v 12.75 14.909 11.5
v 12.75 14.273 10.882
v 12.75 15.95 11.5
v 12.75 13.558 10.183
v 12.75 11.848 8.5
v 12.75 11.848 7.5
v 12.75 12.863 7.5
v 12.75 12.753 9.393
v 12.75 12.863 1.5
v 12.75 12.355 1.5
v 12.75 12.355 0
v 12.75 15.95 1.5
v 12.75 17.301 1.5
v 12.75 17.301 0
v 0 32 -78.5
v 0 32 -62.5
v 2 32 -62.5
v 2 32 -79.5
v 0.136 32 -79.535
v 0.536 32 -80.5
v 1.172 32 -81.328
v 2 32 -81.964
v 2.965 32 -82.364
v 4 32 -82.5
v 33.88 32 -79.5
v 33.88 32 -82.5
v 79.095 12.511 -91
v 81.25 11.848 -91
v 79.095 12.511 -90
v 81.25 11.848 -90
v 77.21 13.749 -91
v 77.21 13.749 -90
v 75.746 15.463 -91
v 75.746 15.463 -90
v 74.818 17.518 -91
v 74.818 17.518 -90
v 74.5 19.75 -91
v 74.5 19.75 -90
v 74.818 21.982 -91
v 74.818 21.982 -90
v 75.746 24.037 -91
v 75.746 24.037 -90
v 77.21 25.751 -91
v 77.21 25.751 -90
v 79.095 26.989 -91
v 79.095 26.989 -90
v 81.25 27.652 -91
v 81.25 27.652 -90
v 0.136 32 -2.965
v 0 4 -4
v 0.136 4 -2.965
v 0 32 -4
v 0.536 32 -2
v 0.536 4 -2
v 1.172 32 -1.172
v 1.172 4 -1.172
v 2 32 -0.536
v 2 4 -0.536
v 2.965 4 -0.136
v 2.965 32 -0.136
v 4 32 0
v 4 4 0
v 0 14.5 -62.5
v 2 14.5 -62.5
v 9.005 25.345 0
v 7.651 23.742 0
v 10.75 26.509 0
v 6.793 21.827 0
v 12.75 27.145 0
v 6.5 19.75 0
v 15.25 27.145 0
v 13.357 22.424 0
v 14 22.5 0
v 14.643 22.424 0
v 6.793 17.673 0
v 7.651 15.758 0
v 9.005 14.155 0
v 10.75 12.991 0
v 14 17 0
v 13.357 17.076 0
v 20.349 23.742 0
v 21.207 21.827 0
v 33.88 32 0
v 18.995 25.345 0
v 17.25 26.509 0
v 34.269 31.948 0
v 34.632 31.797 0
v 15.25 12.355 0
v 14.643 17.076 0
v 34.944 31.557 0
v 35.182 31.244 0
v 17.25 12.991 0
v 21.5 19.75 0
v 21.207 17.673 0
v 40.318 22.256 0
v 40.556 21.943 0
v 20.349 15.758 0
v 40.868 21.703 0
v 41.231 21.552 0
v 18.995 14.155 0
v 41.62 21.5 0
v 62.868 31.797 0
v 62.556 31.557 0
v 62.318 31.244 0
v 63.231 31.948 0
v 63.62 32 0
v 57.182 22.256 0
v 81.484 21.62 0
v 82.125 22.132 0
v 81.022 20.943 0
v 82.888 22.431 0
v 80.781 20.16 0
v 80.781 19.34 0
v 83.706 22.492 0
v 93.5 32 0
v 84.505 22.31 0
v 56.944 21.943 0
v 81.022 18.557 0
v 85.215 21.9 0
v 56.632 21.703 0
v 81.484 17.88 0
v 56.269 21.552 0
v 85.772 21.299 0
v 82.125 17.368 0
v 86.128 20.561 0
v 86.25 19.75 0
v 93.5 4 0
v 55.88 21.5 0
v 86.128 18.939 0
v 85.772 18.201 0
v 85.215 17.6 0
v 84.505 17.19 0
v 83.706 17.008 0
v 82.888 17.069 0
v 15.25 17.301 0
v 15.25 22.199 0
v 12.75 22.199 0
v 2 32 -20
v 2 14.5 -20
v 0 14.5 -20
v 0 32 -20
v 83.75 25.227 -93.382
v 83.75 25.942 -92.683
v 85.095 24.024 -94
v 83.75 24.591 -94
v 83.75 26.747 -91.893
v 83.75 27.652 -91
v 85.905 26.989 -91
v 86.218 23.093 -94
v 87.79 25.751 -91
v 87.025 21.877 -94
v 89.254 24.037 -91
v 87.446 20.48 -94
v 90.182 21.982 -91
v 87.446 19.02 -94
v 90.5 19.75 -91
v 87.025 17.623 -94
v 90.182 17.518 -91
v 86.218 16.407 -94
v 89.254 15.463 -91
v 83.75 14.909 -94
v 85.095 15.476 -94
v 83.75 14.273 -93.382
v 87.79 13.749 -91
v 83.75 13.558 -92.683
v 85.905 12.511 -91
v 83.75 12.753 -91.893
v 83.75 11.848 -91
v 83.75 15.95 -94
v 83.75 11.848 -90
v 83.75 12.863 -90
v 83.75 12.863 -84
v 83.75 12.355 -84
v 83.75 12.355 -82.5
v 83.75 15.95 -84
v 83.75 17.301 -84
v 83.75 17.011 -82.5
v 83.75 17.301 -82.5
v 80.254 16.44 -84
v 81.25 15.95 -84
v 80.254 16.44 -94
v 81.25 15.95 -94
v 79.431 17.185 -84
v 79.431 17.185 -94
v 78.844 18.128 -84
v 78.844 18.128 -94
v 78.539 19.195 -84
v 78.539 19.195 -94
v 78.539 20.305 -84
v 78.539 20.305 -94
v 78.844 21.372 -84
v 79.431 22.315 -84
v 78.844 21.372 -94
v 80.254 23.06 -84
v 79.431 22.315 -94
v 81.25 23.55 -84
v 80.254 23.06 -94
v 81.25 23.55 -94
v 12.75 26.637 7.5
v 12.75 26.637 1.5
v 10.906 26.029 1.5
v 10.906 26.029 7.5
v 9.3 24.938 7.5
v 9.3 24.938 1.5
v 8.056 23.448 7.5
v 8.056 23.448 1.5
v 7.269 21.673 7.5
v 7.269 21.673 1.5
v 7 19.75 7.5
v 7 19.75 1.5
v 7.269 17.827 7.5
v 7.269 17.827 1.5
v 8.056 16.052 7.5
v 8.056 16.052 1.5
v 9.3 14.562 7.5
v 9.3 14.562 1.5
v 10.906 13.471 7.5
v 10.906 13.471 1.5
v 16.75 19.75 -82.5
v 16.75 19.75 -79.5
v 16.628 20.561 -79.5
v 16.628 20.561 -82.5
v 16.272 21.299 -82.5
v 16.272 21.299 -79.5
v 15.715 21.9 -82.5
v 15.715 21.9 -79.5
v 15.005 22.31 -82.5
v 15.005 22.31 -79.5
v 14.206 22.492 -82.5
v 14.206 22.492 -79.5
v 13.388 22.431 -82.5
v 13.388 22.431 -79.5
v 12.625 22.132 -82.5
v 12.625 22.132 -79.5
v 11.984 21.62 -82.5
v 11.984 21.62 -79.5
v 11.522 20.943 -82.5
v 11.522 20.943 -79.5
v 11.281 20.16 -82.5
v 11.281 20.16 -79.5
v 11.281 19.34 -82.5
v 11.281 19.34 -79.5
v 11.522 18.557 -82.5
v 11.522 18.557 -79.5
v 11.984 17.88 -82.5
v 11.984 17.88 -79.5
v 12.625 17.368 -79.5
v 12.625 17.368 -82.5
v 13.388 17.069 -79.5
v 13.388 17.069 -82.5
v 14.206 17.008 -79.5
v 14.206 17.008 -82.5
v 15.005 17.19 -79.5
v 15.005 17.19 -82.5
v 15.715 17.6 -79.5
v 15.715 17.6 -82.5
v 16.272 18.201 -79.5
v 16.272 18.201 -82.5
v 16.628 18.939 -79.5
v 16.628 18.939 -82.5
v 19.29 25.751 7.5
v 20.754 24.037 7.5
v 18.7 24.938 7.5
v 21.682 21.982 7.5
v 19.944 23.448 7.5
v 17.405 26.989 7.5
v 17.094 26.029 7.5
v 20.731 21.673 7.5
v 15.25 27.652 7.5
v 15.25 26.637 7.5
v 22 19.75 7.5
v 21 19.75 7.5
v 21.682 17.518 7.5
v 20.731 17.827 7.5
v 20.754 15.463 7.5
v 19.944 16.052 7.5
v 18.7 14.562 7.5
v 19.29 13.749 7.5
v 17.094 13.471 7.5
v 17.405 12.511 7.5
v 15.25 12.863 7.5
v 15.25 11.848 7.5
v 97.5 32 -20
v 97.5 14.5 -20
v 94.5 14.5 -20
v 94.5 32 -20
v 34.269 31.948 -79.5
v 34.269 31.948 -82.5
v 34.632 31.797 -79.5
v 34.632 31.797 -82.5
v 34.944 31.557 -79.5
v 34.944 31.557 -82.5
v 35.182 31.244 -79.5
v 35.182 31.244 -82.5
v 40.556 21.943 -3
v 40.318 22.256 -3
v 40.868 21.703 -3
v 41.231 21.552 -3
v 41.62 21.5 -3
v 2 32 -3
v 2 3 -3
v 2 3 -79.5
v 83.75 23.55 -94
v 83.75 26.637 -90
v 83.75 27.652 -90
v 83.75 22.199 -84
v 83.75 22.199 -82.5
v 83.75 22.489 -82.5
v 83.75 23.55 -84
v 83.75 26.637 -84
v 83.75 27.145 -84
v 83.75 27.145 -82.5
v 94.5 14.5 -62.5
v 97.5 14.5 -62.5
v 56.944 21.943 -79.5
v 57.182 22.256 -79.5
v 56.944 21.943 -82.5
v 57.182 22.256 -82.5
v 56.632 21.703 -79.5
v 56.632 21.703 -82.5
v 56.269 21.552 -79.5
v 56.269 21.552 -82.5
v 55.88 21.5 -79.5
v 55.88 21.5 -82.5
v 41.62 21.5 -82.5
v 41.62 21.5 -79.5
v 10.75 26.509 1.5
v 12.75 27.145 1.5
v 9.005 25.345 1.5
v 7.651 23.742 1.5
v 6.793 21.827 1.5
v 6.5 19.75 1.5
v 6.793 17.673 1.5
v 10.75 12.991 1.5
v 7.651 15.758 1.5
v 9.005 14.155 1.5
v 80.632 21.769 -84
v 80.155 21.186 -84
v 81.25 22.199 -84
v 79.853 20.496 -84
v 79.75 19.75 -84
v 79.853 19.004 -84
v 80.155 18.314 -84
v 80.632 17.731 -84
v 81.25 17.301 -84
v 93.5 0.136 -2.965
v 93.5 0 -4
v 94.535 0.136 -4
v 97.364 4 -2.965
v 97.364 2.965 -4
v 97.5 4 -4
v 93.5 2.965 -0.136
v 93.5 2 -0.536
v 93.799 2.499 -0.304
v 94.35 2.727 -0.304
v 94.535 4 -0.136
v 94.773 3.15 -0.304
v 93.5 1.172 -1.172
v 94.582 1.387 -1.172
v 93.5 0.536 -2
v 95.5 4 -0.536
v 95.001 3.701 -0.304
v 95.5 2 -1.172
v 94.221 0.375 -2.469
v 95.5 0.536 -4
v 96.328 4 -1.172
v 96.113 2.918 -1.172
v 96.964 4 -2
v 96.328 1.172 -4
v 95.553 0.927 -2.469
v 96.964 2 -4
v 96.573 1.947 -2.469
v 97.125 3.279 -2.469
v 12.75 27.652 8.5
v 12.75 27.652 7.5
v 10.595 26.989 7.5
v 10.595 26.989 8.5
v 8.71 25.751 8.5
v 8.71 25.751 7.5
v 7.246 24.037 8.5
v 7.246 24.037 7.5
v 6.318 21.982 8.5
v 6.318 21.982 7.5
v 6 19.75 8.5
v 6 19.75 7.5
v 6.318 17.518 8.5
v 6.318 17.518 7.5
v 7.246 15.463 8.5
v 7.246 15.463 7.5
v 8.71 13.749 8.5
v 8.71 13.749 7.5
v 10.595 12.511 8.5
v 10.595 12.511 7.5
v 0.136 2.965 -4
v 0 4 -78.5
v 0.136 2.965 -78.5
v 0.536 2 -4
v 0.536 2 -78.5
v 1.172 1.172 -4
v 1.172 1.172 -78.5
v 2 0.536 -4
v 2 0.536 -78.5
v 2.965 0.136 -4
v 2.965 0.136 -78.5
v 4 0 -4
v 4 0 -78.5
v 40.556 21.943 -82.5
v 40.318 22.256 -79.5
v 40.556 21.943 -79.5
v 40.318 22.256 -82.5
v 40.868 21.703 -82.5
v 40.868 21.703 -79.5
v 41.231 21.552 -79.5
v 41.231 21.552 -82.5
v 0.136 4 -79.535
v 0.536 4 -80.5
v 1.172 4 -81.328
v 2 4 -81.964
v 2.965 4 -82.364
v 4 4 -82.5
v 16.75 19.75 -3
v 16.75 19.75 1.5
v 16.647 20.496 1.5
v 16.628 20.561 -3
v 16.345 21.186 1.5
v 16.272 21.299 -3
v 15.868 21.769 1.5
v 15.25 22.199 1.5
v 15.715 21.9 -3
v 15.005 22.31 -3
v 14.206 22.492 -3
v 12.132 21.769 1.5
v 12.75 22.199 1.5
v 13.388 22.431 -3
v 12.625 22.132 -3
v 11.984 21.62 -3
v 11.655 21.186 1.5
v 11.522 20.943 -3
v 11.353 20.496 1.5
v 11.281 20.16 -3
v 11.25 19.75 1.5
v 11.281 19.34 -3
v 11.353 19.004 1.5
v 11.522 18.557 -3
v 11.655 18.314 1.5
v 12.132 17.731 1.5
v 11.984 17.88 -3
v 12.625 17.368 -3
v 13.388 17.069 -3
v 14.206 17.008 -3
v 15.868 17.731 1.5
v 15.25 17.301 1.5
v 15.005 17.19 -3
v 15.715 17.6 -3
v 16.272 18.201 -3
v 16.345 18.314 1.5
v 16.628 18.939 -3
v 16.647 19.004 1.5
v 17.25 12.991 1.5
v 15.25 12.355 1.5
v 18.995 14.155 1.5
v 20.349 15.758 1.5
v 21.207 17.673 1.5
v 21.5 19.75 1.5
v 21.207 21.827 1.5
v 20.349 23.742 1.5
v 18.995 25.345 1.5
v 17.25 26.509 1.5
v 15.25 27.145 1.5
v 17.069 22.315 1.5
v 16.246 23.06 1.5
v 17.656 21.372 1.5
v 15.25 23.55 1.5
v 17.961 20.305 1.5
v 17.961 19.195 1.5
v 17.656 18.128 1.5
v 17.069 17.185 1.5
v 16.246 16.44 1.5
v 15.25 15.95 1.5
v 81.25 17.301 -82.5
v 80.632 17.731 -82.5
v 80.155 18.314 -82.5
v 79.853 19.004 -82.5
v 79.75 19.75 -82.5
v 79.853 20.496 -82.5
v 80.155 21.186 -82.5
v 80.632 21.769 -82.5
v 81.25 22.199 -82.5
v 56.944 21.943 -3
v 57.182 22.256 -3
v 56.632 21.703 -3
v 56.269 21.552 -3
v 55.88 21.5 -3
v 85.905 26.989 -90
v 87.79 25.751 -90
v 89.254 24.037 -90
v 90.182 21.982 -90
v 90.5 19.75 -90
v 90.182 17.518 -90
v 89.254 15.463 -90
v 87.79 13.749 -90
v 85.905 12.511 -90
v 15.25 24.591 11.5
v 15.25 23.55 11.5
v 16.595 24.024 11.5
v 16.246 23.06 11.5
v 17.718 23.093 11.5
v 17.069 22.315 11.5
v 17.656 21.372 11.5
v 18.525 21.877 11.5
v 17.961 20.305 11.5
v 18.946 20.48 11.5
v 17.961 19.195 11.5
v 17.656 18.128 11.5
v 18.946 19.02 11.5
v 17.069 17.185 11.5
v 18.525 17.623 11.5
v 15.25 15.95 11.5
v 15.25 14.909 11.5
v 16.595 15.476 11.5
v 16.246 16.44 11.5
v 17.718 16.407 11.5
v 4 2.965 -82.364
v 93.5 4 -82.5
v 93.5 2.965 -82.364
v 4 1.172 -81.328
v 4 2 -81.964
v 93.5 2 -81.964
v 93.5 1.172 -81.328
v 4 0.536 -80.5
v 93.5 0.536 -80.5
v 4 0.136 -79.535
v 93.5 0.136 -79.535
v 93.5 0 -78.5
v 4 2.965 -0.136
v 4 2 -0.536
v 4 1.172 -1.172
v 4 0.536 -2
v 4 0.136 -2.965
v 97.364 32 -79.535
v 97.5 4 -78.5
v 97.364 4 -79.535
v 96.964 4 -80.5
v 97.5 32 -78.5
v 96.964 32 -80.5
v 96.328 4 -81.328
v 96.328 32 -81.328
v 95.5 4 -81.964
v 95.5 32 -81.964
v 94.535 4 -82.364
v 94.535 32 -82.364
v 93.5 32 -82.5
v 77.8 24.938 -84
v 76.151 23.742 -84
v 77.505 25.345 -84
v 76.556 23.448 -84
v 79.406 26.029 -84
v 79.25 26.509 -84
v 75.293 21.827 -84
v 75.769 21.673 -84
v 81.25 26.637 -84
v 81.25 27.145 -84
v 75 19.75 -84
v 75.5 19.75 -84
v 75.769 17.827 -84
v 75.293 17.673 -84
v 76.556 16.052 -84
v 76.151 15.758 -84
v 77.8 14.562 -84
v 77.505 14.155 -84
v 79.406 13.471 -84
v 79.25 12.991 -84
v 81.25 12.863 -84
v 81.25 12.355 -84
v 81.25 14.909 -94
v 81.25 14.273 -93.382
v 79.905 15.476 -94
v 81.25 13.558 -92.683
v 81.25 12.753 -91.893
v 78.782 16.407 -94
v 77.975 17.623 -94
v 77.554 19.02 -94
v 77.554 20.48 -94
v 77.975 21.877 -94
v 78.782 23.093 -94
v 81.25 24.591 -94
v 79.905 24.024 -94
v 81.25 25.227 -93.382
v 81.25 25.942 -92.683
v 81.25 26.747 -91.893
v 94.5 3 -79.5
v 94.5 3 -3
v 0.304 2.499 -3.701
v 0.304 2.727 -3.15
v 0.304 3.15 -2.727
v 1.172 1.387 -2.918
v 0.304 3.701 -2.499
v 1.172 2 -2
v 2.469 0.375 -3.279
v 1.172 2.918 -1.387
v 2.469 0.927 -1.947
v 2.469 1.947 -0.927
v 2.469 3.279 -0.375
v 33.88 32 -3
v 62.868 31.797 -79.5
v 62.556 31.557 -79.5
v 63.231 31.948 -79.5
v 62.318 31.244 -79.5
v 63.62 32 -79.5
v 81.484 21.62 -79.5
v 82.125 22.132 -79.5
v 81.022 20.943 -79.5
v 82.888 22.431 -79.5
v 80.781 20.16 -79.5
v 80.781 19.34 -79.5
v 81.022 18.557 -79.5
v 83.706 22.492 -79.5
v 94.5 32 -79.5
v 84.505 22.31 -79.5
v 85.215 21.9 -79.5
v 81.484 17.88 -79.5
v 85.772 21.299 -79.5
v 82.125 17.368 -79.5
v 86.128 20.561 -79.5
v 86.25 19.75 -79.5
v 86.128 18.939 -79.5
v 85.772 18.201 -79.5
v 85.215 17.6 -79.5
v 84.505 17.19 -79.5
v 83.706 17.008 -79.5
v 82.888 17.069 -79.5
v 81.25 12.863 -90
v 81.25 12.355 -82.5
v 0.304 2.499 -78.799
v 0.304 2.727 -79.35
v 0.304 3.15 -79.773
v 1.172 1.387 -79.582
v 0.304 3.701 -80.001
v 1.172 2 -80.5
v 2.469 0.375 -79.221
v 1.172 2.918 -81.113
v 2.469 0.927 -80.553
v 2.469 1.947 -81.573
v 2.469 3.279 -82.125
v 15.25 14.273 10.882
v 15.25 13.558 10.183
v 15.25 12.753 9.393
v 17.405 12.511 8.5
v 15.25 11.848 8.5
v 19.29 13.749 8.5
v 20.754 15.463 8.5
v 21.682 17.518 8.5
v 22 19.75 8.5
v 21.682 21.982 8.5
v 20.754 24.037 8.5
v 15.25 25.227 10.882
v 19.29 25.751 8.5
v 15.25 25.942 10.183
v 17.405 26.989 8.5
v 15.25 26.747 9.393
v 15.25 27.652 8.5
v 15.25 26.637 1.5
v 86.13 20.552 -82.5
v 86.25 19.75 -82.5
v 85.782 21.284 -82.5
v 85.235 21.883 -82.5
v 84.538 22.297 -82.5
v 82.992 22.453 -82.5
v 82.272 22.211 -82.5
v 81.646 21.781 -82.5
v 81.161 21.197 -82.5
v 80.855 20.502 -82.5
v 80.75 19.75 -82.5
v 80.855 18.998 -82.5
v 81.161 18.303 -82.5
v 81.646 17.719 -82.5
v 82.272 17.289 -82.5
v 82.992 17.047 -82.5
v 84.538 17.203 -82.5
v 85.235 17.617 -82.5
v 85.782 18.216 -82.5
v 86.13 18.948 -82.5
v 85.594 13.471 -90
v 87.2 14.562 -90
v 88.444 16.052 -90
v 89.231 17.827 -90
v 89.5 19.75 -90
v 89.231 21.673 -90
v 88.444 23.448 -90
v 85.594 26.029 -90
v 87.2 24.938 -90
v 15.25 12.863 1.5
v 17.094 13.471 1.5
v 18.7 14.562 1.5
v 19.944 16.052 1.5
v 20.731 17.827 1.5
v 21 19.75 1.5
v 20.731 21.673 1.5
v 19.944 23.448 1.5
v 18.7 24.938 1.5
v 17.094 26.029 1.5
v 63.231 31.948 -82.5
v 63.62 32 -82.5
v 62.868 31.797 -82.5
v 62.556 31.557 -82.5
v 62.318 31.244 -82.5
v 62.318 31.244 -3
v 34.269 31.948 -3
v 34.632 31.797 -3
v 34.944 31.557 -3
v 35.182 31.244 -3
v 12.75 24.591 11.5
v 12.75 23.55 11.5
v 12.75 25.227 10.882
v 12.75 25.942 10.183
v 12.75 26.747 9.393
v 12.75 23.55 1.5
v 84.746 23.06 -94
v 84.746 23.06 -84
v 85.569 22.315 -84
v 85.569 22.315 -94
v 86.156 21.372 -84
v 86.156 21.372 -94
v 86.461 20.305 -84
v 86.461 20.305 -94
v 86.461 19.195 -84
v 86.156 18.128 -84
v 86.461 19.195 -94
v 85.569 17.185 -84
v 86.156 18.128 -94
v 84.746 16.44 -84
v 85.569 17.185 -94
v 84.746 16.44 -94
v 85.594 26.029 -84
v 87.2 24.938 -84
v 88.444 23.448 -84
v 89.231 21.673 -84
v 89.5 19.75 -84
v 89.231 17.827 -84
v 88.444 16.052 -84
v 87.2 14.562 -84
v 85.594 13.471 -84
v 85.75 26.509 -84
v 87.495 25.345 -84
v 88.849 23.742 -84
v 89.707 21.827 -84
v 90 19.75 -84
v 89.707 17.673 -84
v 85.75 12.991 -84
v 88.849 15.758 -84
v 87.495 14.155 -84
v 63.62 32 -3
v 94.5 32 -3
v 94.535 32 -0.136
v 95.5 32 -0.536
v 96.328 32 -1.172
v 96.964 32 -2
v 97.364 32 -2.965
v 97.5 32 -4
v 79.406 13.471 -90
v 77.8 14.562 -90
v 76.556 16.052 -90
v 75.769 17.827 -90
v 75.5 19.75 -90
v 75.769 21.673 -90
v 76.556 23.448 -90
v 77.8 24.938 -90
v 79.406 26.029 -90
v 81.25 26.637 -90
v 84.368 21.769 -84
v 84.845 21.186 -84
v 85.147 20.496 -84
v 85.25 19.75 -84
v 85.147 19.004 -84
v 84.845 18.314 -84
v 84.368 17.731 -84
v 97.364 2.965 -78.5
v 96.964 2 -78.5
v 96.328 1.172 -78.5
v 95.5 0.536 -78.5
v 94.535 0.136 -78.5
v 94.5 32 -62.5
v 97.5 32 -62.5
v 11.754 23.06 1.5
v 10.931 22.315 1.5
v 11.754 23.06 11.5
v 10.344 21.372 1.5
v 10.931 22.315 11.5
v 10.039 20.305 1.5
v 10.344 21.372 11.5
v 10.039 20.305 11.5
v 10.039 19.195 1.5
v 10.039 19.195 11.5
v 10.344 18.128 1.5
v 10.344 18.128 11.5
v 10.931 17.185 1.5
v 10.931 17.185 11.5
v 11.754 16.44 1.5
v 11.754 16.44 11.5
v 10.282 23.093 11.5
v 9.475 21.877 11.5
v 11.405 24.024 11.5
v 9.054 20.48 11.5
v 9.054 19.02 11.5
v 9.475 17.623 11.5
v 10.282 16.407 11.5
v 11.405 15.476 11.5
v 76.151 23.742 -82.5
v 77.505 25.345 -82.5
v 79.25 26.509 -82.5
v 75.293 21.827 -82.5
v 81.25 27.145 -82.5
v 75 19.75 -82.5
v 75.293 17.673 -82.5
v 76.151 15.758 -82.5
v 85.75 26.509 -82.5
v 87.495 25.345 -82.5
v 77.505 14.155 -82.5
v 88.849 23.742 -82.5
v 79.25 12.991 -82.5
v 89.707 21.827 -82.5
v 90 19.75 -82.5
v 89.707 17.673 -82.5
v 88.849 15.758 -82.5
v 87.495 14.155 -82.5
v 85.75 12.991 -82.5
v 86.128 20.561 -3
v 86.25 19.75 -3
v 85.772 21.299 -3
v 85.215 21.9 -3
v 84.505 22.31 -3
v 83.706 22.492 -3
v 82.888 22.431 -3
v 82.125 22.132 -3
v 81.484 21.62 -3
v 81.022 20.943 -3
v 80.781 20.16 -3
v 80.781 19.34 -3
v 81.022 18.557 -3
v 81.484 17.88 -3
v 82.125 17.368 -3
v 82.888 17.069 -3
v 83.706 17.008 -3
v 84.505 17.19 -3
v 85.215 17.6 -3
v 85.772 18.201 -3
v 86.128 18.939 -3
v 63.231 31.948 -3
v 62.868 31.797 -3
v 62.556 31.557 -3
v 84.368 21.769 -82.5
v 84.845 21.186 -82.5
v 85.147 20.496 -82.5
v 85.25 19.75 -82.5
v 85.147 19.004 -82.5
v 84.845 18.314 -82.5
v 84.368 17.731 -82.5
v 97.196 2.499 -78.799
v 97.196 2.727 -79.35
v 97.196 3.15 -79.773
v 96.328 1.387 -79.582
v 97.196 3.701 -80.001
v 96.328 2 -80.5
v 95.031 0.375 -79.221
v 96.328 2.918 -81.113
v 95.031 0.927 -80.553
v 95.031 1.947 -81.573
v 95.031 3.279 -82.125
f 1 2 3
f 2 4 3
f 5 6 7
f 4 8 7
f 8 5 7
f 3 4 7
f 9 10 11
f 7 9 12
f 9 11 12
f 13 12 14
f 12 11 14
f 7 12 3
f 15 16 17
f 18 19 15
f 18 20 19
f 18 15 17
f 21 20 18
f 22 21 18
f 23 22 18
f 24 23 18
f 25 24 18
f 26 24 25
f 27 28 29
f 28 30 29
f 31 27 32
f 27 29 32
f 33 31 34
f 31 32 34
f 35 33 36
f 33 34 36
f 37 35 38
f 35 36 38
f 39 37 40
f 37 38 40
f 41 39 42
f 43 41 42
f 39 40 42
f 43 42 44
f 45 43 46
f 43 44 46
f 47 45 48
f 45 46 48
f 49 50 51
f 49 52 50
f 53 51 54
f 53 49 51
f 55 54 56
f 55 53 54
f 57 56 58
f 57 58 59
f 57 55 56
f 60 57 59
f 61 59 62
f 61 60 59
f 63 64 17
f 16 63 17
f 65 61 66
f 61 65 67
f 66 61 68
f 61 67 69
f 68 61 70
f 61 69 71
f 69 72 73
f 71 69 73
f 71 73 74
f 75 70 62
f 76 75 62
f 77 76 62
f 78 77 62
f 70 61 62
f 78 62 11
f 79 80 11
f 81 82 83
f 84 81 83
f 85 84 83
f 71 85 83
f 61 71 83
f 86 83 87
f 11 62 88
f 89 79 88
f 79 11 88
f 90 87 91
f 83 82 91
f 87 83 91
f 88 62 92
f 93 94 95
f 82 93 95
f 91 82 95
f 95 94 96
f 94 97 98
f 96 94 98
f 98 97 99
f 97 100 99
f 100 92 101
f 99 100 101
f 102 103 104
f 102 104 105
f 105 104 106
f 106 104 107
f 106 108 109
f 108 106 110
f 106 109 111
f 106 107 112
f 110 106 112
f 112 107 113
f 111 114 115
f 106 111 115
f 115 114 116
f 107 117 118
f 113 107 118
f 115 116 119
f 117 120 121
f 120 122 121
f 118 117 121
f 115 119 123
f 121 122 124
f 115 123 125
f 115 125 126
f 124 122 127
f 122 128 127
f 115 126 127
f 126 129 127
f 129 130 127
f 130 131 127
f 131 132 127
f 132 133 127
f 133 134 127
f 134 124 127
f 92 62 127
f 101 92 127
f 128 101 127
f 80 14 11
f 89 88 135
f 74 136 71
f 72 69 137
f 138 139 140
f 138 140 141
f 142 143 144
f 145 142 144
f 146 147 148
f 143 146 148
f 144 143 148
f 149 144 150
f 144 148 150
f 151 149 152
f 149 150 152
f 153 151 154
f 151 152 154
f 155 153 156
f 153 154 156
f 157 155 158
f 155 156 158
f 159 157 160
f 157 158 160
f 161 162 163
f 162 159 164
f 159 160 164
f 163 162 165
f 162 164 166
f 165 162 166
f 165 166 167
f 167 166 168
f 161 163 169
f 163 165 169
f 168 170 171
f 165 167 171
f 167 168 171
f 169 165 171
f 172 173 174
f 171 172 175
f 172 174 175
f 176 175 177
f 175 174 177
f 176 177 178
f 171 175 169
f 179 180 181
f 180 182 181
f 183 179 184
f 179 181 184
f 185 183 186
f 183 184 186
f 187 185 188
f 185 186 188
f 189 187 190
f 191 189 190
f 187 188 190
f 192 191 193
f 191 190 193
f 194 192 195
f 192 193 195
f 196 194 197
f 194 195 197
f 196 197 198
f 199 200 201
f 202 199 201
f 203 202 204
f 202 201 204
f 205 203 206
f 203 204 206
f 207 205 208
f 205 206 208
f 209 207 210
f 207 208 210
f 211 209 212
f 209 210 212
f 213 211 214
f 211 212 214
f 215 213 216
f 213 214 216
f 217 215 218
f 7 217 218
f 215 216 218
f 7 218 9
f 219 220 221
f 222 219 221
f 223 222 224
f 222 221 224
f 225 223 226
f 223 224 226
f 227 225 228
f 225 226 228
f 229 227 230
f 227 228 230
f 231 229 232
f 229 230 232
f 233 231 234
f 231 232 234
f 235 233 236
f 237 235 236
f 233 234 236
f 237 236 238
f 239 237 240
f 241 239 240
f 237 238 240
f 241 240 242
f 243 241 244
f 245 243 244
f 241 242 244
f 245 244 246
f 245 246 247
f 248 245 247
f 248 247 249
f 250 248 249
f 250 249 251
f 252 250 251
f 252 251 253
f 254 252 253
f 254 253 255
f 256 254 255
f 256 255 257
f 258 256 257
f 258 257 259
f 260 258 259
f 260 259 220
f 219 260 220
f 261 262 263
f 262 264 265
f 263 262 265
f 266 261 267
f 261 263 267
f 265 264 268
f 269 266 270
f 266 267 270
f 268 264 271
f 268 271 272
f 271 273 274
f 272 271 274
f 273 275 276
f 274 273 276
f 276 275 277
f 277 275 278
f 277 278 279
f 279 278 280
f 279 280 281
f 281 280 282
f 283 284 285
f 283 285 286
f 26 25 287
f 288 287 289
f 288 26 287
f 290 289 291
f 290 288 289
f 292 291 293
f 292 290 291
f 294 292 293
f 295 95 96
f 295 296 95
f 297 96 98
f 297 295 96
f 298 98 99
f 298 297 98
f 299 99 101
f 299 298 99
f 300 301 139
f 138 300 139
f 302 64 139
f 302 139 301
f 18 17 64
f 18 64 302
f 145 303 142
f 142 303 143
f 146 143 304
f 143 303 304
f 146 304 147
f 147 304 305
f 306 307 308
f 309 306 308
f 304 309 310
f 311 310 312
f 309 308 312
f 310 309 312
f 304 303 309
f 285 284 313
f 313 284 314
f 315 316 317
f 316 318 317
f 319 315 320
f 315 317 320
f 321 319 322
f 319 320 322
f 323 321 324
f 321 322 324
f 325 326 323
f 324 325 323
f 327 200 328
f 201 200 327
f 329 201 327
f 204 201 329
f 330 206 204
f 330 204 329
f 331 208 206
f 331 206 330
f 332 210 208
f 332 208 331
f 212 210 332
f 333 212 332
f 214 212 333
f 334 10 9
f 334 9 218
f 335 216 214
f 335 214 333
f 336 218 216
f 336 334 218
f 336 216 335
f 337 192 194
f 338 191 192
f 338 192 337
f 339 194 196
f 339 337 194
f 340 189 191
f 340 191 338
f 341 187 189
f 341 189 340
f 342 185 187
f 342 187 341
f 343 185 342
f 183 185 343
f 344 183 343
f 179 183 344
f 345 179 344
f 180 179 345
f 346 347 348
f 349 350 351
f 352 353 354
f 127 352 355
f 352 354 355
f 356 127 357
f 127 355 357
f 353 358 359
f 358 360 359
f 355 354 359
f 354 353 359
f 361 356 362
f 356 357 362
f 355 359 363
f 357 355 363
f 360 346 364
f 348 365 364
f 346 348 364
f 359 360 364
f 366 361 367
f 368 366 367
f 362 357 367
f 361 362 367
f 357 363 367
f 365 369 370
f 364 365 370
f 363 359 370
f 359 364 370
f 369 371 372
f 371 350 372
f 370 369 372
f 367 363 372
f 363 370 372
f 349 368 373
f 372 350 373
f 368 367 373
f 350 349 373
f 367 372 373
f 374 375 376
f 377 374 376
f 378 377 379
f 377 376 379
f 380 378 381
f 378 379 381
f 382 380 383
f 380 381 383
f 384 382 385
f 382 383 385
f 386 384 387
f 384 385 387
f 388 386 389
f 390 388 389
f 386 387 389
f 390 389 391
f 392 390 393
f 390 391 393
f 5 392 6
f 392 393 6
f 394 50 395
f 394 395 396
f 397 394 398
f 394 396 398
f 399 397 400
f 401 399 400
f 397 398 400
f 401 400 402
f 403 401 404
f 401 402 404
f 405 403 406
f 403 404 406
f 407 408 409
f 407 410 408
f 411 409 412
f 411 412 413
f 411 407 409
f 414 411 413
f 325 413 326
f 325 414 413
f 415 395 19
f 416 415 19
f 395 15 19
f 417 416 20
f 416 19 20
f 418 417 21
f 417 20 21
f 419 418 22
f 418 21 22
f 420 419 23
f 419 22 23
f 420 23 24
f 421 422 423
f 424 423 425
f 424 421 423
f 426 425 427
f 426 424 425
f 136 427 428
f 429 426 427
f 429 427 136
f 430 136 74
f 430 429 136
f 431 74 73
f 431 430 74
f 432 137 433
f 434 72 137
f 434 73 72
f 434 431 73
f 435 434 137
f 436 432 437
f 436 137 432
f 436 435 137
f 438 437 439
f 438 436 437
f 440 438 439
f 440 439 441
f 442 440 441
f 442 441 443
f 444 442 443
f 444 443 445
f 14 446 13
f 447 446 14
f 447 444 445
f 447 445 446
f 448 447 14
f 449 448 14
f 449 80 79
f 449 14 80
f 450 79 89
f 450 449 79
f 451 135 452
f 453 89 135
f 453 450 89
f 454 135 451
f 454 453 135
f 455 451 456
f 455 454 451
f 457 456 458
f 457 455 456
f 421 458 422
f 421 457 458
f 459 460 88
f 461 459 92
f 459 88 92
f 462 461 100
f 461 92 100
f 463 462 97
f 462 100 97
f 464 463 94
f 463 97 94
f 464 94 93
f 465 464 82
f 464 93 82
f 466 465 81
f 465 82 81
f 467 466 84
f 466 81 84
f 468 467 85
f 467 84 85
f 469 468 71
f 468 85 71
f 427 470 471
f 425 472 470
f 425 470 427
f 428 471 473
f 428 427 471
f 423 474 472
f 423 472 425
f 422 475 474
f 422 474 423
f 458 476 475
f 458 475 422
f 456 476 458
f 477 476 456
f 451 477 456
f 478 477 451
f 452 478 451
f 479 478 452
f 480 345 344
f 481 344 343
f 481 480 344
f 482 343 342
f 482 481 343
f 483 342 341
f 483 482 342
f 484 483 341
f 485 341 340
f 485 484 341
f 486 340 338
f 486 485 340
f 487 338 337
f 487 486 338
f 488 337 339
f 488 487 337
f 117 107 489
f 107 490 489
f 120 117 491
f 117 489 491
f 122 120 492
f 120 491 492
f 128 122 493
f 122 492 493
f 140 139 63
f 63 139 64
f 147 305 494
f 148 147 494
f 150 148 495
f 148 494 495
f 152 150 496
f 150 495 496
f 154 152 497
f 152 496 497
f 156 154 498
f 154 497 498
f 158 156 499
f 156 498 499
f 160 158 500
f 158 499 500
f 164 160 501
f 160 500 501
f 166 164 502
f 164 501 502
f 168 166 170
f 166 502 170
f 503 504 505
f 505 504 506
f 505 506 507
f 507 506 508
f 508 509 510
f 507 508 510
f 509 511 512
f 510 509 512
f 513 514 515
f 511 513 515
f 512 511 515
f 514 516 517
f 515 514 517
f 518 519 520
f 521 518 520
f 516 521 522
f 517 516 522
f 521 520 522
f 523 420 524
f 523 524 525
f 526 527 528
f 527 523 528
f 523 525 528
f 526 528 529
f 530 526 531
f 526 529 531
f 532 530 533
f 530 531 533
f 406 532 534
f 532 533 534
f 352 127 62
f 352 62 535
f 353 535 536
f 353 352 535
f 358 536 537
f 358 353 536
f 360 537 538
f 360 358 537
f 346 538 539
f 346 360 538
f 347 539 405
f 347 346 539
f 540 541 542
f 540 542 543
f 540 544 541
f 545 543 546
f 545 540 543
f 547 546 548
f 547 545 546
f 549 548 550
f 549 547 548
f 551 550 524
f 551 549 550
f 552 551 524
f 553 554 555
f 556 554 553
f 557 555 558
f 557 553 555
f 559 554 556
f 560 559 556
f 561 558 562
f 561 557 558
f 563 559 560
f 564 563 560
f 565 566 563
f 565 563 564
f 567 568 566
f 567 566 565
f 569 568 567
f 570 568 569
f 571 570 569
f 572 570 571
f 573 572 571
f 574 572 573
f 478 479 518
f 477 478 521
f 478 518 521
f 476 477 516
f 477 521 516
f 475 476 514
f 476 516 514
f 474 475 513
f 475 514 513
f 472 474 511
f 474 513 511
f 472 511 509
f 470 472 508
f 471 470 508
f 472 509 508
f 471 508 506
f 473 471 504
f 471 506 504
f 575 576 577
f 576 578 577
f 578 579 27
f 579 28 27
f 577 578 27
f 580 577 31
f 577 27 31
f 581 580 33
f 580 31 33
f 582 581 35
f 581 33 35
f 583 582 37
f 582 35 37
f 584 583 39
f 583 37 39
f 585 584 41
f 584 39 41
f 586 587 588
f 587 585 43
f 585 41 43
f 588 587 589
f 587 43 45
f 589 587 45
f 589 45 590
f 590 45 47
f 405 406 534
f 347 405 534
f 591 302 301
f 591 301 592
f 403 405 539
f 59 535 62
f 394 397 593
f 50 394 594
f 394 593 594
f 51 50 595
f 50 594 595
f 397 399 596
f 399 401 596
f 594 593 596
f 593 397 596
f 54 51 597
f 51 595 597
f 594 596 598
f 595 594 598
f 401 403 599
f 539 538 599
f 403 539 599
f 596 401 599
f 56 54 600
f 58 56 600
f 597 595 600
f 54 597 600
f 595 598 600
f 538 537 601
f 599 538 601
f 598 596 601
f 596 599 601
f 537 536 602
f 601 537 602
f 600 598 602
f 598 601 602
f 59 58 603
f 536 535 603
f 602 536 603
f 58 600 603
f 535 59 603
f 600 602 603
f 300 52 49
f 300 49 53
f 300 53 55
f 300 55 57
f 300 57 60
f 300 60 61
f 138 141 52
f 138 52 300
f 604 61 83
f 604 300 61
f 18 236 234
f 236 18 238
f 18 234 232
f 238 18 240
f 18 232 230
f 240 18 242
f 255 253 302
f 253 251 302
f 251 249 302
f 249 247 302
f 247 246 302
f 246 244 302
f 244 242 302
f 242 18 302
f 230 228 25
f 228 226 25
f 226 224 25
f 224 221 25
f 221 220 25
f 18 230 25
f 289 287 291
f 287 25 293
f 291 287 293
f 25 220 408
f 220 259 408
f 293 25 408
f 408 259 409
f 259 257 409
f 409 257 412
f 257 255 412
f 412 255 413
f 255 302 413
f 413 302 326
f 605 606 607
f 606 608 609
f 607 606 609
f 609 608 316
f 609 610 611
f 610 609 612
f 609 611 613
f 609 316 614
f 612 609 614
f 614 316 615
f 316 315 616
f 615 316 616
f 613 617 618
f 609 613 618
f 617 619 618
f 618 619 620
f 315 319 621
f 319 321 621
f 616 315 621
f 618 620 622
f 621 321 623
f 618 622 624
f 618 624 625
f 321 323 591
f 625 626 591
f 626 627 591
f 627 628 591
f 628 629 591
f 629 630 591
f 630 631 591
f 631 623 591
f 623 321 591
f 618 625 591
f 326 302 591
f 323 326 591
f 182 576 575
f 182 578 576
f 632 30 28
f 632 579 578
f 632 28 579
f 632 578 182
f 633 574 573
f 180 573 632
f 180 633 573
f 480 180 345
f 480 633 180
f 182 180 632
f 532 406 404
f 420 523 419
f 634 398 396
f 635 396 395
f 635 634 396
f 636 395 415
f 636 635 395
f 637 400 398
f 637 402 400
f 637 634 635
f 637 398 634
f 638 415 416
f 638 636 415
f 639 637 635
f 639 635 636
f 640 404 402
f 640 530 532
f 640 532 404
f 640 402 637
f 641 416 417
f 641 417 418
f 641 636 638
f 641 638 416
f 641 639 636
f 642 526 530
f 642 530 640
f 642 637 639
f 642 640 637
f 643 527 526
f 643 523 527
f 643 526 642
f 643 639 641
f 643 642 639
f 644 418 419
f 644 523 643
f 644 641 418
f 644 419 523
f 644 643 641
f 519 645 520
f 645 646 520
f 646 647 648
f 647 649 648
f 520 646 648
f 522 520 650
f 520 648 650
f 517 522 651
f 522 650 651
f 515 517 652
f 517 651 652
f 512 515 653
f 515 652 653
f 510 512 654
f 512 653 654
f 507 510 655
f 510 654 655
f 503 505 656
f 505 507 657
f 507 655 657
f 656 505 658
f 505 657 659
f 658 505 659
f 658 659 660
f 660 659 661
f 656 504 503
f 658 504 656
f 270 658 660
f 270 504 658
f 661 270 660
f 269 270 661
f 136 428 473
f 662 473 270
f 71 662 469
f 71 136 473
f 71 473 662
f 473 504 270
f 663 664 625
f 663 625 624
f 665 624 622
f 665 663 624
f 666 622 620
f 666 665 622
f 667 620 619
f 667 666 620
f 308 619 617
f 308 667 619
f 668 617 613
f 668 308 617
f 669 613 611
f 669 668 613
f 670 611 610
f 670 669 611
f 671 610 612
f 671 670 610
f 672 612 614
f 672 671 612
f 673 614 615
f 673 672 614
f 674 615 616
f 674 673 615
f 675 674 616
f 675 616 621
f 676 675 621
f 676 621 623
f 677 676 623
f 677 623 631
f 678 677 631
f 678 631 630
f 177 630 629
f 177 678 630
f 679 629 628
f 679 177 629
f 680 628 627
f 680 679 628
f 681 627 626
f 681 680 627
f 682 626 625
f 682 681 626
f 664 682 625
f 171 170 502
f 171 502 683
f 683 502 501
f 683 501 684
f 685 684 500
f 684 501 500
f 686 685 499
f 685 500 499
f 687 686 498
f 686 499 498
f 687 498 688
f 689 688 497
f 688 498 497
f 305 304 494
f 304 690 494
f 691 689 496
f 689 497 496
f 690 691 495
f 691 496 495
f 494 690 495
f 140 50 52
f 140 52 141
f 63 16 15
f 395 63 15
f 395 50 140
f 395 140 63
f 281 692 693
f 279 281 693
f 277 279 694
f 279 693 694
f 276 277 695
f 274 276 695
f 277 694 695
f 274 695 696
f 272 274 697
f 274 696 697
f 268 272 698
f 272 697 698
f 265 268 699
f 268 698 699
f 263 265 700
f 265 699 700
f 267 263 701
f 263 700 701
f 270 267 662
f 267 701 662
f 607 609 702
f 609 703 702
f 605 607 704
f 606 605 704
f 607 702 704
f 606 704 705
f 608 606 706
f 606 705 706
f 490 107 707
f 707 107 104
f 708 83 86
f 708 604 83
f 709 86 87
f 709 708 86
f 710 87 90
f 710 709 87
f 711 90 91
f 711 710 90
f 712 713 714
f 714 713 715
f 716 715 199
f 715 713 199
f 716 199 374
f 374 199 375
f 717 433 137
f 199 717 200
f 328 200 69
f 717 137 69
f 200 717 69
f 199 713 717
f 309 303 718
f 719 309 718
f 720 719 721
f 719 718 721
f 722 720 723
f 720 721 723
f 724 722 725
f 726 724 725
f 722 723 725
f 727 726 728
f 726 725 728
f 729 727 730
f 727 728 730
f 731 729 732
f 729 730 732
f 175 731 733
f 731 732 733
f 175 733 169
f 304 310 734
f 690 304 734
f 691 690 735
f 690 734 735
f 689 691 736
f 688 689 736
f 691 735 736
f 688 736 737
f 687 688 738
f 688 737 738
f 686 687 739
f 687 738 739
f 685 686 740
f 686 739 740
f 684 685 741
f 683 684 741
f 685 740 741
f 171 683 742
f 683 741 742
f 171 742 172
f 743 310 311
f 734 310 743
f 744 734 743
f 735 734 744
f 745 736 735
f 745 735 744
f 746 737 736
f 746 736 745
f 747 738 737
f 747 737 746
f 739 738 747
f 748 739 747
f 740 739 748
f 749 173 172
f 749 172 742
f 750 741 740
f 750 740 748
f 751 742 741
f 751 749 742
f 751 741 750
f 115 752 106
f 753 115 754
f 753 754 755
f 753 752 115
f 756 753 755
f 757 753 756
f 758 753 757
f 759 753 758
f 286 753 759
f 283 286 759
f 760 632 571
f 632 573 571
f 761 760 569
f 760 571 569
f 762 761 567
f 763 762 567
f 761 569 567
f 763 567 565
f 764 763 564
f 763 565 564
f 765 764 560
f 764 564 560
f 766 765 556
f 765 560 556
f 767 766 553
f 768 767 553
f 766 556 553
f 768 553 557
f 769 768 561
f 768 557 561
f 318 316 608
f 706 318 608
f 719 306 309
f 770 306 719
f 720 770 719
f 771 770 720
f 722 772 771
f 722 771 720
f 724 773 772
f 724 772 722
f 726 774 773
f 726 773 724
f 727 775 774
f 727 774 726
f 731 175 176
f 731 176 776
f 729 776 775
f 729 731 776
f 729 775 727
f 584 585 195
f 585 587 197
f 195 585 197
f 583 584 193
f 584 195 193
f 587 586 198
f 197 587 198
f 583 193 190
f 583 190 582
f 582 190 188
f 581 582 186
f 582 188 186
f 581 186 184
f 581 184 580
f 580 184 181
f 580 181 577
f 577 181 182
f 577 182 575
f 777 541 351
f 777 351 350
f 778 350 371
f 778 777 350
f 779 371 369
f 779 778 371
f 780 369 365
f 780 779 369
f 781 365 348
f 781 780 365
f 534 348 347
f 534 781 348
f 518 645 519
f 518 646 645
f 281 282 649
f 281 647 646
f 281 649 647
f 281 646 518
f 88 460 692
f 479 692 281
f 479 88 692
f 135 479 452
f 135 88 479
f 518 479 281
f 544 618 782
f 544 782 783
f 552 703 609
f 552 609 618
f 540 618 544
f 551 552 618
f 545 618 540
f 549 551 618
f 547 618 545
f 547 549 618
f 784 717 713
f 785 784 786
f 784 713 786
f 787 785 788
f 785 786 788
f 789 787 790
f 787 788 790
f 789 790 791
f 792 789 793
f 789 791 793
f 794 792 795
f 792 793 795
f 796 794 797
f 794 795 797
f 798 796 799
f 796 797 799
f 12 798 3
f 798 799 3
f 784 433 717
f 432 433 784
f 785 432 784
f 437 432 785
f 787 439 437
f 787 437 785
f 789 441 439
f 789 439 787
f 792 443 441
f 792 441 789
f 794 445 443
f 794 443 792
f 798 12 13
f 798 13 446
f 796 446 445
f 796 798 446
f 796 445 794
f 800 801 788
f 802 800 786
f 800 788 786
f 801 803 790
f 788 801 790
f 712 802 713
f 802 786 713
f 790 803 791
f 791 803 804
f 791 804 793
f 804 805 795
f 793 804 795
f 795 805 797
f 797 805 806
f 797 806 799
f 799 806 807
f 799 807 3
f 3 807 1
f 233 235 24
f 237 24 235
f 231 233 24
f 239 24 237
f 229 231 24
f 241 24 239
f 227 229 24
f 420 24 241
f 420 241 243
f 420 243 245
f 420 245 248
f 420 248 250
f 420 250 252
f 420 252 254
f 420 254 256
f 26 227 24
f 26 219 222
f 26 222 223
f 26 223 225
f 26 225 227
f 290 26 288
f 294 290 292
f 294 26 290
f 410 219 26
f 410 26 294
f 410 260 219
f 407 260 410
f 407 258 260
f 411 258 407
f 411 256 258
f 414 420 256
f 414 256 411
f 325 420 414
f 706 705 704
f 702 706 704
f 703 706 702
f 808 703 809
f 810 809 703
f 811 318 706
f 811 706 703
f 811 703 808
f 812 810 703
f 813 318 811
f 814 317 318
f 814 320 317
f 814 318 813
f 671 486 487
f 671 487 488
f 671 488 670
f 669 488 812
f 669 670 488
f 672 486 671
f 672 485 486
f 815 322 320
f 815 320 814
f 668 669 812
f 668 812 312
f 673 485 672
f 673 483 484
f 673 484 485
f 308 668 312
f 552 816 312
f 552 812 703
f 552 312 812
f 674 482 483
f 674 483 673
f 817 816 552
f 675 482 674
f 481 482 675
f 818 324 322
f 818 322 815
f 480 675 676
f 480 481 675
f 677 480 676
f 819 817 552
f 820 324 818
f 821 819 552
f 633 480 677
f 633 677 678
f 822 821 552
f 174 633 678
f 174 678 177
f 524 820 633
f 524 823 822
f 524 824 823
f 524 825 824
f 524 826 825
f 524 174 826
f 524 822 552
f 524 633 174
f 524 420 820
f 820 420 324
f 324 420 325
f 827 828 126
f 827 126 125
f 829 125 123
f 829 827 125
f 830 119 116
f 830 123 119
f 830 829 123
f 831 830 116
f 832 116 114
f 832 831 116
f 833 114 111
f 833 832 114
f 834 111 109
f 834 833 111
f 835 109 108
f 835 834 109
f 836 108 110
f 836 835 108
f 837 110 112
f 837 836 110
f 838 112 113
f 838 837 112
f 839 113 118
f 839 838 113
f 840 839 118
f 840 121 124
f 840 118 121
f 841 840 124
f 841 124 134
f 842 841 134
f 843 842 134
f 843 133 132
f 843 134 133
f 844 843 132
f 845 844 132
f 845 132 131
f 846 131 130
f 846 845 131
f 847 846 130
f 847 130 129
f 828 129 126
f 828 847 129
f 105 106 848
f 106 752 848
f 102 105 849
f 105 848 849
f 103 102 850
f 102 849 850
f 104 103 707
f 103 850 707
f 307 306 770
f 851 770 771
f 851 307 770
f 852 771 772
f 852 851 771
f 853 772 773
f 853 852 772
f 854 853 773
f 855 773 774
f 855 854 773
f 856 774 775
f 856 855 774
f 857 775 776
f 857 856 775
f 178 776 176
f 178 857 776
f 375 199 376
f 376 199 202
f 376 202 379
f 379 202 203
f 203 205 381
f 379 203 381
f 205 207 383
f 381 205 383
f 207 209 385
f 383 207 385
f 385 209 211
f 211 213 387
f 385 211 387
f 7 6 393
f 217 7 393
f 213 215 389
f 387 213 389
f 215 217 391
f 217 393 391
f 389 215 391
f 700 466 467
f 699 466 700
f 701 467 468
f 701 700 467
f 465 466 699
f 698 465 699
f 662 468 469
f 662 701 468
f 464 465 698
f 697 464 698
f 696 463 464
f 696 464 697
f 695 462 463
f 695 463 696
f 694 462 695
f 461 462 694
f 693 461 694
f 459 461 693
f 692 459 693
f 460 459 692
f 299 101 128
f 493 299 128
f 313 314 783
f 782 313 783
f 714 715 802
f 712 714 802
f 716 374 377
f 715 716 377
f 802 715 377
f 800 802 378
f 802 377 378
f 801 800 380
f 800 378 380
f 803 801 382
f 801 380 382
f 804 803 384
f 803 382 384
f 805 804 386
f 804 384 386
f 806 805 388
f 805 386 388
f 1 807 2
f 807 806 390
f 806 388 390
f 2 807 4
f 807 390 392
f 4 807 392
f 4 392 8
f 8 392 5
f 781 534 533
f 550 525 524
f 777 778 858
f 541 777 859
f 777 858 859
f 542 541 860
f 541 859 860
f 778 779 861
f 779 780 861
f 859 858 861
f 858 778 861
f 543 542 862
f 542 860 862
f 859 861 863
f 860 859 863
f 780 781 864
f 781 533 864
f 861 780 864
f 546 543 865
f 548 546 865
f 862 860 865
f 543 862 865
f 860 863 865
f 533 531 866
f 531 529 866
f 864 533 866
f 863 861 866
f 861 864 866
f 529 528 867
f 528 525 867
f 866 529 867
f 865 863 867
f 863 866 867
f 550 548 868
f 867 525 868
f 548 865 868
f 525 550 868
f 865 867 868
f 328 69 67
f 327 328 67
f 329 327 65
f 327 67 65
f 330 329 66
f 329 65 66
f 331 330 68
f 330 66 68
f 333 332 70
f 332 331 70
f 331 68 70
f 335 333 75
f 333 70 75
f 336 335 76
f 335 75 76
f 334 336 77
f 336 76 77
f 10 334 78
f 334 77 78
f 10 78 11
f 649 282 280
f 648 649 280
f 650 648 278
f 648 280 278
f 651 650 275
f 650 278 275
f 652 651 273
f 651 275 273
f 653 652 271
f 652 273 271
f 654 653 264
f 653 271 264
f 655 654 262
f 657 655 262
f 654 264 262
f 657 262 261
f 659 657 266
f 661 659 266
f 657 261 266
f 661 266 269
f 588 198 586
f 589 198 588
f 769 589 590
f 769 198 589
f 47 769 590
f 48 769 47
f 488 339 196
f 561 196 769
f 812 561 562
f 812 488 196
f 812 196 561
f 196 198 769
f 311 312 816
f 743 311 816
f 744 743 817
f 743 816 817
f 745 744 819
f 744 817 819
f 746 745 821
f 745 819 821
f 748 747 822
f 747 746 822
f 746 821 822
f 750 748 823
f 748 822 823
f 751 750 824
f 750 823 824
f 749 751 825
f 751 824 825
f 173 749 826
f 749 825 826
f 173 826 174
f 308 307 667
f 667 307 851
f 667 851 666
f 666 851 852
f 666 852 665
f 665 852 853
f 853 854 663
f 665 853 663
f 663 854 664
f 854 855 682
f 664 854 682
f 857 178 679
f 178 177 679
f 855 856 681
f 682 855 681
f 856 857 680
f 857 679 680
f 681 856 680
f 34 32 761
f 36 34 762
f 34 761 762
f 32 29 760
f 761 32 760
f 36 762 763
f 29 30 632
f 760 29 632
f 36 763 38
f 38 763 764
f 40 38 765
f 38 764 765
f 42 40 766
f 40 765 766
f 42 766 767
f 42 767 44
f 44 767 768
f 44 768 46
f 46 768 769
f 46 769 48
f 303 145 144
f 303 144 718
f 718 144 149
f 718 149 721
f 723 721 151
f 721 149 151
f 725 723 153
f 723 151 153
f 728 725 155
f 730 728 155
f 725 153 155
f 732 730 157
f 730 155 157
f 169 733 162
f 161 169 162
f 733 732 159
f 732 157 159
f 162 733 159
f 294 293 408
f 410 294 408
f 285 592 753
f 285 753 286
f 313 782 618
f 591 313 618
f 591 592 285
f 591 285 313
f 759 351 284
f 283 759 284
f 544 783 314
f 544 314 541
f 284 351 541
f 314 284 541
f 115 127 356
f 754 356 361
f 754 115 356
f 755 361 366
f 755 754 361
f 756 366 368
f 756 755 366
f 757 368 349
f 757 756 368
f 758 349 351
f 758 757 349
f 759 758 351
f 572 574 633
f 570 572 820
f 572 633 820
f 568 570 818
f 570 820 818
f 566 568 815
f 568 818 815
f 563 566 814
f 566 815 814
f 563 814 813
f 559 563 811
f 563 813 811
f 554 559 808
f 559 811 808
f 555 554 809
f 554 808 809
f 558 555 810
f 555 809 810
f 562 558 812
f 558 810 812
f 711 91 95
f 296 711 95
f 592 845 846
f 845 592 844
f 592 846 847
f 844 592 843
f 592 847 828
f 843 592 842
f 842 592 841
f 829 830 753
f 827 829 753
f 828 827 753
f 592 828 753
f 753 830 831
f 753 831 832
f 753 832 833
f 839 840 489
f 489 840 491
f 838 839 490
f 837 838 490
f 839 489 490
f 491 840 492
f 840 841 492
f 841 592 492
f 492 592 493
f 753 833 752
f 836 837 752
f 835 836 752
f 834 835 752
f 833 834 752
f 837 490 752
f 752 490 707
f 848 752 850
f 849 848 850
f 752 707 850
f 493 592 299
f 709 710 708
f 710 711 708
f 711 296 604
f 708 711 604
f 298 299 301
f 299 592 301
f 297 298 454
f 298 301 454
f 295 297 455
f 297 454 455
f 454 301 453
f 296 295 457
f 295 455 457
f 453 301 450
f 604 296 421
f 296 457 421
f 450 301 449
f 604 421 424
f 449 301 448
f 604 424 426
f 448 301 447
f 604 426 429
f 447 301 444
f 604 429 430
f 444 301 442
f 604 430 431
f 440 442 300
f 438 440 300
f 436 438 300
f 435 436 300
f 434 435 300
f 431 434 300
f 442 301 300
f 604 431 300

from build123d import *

# Parameters (mm, degrees)
SKETCH1_W                                    = 97.5
SKETCH1_H                                    = 82.5
BOSS_EXTRUDE1_DEPTH                          = 32
SHELL1_T                                     = -3
FILLET1_R                                    = 4
CUT_EXTRUDE1_START                           = -1
SKETCH4_W                                    = 76.5
SKETCH4_H                                    = 29
CUT_EXTRUDE1_DEPTH                           = 83.5
CUT_EXTRUDE2_REACH                           = 133.668
SKETCH5_W                                    = 42.5
SKETCH5_H                                    = 17.5
CUT_EXTRUDE3_REACH                           = 133.668
FILLET2_R                                    = 1.5
CUT_EXTRUDE4_START                           = -82.5
SKETCH7_R                                    = 2.75
CUT_EXTRUDE4_DEPTH                           = 82.5
SKETCH9_R                                    = 7.5
SKETCH9_R_2                                  = 2.75
BOSS_EXTRUDE3_DEPTH                          = 1.5
CUT_EXTRUDE5_REACH                           = 133.668
SKETCH11_W                                   = 2.5
SKETCH11_H                                   = 16
MIRROR2_AT_THE_SECOND_PLANE_COPY_1_SKETC_R   = 7.5
MIRROR2_AT_THE_SECOND_PLANE_COPY_1_SKETC_R_2 = 2.75
MIRROR2_AT_THE_SECOND_PLANE_COPY_1_DEPTH     = 1.5
MIRROR2_AT_THE_SECOND_PLANE_COPY_3_REACH     = 133.668
MIRROR2_AT_THE_SECOND_PLANE_COPY_3_SKETC_W   = 2.5
MIRROR2_AT_THE_SECOND_PLANE_COPY_3_SKETC_H   = 16
SKETCH12_W                                   = 25.238507428
SKETCH12_H                                   = 22.458767107
CUT_EXTRUDE6_DEPTH                           = 11.5
CUT_EXTRUDE7_REACH                           = 141.163
SKETCH13_W                                   = 31.509123874
SKETCH13_H                                   = 19.339493898


with BuildPart() as part:
    # Sketch1 → Boss-Extrude1 (new body)
    with BuildSketch(Plane(origin=(0, 0, 0), x_dir=(1, 0, 0), z_dir=(0, 1, 0))):
        with Locations((48.75, 41.25)):
            Rectangle(SKETCH1_W, SKETCH1_H)
    extrude(amount=BOSS_EXTRUDE1_DEPTH)

    # Shell1
    shell1_openings = [part.faces().sort_by_distance(p)[0] for p in [
        (48.75, 32, -41.25),
    ]]
    offset(amount=SHELL1_T, openings=shell1_openings, kind=Kind.INTERSECTION)

    # Fillet1
    fillet1_edges = [part.edges().sort_by_distance(p)[0] for p in [
        (48.75, 0, -82.5),
        (97.5, 0, -41.25),
        (48.75, 0, 0),
        (0, 0, -41.25),
        (0, 16, -82.5),
        (97.5, 16, -82.5),
        (97.5, 16, 0),
        (0, 16, 0),
    ]]
    fillet(fillet1_edges, radius=FILLET1_R)

    # Sketch4 → Cut-Extrude1 (cut)
    with BuildSketch(Plane(origin=(3, 0, 0), x_dir=(0, 0, -1), z_dir=(1, 0, 0)).offset(CUT_EXTRUDE1_START)):
        with Locations((41.25, 17.5)):
            Rectangle(SKETCH4_W, SKETCH4_H)
    extrude(amount=CUT_EXTRUDE1_DEPTH, mode=Mode.SUBTRACT)

    # Cut-Extrude2: up to this face of the body (flat: up to its plane)
    cut_extrude2_end = Plane(part.part.faces().sort_by_distance((0, 18, -41.25))[0])
    # Sketch5 → Cut-Extrude2 (cut, up to the picked face)
    with BuildSketch(Plane(origin=(97.5, 0, 0), x_dir=(0, 0, -1), z_dir=(1, 0, 0)), mode=Mode.PRIVATE) as cut_extrude2_sk1:
        with Locations((41.25, 23.25)):
            Rectangle(SKETCH5_W, SKETCH5_H)
    cut_extrude2_tool1 = split(extrude(cut_extrude2_sk1.sketch, amount=-CUT_EXTRUDE2_REACH, mode=Mode.PRIVATE), bisect_by=cut_extrude2_end, keep=Keep.BOTH, mode=Mode.PRIVATE)
    add(cut_extrude2_tool1.solids().sort_by(Axis((97.5, 23.25, -41.25), (-1, 0, 0)))[0], mode=Mode.SUBTRACT)

    # Cut-Extrude3: up to this face of the body (flat: up to its plane)
    cut_extrude3_end = Plane(part.part.faces().sort_by_distance((48.75, 18, -82.5))[0])
    # Sketch6 → Cut-Extrude3 (cut, up to the picked face)
    with BuildSketch(Plane.XY, mode=Mode.PRIVATE) as cut_extrude3_sk1:
        Polygon((40.75, 21.5), (56.75, 21.5), (62.75, 32), (34.75, 32), align=None)
    cut_extrude3_tool1 = split(extrude(cut_extrude3_sk1.sketch, amount=-CUT_EXTRUDE3_REACH, mode=Mode.PRIVATE), bisect_by=cut_extrude3_end, keep=Keep.BOTH, mode=Mode.PRIVATE)
    add(cut_extrude3_tool1.solids().sort_by(Axis((48.75, 27.227273, 0), (0, 0, -1)))[0], mode=Mode.SUBTRACT)

    # Fillet2
    fillet2_edges = [part.edges().sort_by_distance(p)[0] for p in [
        (40.75, 21.5, -1.5),
        (34.75, 32, -1.5),
        (62.75, 32, -1.5),
        (56.75, 21.5, -1.5),
        (40.75, 21.5, -81),
        (34.75, 32, -81),
        (62.75, 32, -81),
        (56.75, 21.5, -81),
    ]]
    fillet(fillet2_edges, radius=FILLET2_R)

    # Sketch7 → Cut-Extrude4 (cut)
    with BuildSketch(Plane.XY.offset(CUT_EXTRUDE4_START)):
        with Locations((14, 19.75)):
            Circle(SKETCH7_R)
        with Locations((83.5, 19.75)):
            Circle(SKETCH7_R)
    extrude(amount=CUT_EXTRUDE4_DEPTH, mode=Mode.SUBTRACT)

    # Sketch9 → Boss-Extrude3 (add)
    with BuildSketch(Plane.XY):
        with Locations(Location((14, 19.75, 0), (0, 0, 180))):
            Circle(SKETCH9_R)
        with Locations((14, 19.75)):
            Circle(SKETCH9_R_2, mode=Mode.SUBTRACT)
    boss_extrude3 = extrude(amount=BOSS_EXTRUDE3_DEPTH)

    # Sketch10 → Revolve1 (revolve)
    with BuildSketch(Plane.ZY.offset(-14), mode=Mode.PRIVATE) as revolve1_sk:
        Polygon((11.5, 24.75), (8.5, 27.75), (7.5, 27.75), (7.5, 26.75), (1.5, 26.75), (1.5, 23.75), (11.5, 23.75), align=None)
    revolve1 = revolve(revolve1_sk.sketch.rotate(Axis((14, 19.75, 0), (0, 0, 1)), 90), axis=Axis((14, 19.75, 0), (0, 0, 1)))

    # Cut-Extrude5: up to this face of the body (flat: up to its plane)
    cut_extrude5_end = Plane(part.part.faces().sort_by_distance((18.141421356, 19.75, 11.5))[0])
    # Sketch11 → Cut-Extrude5 (cut, up to the picked face)
    with BuildSketch(Plane.XY, mode=Mode.PRIVATE) as cut_extrude5_sk1:
        with Locations((14, 19.75)):
            Rectangle(SKETCH11_W, SKETCH11_H)
    cut_extrude5_tool1 = split(extrude(cut_extrude5_sk1.sketch, amount=CUT_EXTRUDE5_REACH, mode=Mode.PRIVATE), bisect_by=cut_extrude5_end, keep=Keep.BOTH, mode=Mode.PRIVATE)
    cut_extrude5 = cut_extrude5_tool1.solids().sort_by(Axis((14, 19.75, 0), (0, 0, 1)))[0]
    add(cut_extrude5, mode=Mode.SUBTRACT)

    # Mirror2: Boss-Extrude3, Revolve1, Cut-Extrude5 across plane
    add(boss_extrude3.mirror(Plane.ZY.offset(-48.25)))
    add(revolve1.mirror(Plane.ZY.offset(-48.25)))
    add(cut_extrude5.mirror(Plane.ZY.offset(-48.25)), mode=Mode.SUBTRACT)

    # Mirror2 at the second plane: Boss-Extrude3, Revolve1, Cut-Extrude5 across plane
    add(boss_extrude3.mirror(Plane.XY.offset(-41.25)))
    add(revolve1.mirror(Plane.XY.offset(-41.25)))
    add(cut_extrude5.mirror(Plane.XY.offset(-41.25)), mode=Mode.SUBTRACT)

    # Mirror2 at the second plane copy 1 sketc → Mirror2 at the second plane copy 1 (add)
    with BuildSketch(Plane(origin=(96.5, 0, -82.5), x_dir=(-1, 0, 0), z_dir=(0, 0, -1))):
        with Locations(Location((14, 19.75, 0), (0, 0, 180))):
            Circle(MIRROR2_AT_THE_SECOND_PLANE_COPY_1_SKETC_R)
        with Locations((14, 19.75)):
            Circle(MIRROR2_AT_THE_SECOND_PLANE_COPY_1_SKETC_R_2, mode=Mode.SUBTRACT)
    extrude(amount=MIRROR2_AT_THE_SECOND_PLANE_COPY_1_DEPTH)

    # Mirror2 at the second plane copy 2 sketc → Mirror2 at the second plane copy 2 (revolve)
    with BuildSketch(Plane(origin=(82.5, 0, -82.5), x_dir=(0, 0, -1), z_dir=(1, 0, 0))):
        Polygon((11.5, 24.75), (8.5, 27.75), (7.5, 27.75), (7.5, 26.75), (1.5, 26.75), (1.5, 23.75), (11.5, 23.75), align=None)
    revolve(axis=Axis((82.5, 19.75, -82.5), (0, 0, -1)))

    # Mirror2 at the second plane copy 3: up to this face of the body (flat: up to its plane)
    mirror2_at_the_second_plane_copy_3_end = Plane(part.part.faces().sort_by_distance((78.358578644, 19.75, -94))[0])
    # Mirror2 at the second plane copy 3 sketc → Mirror2 at the second plane copy 3 (cut, up to the picked face)
    with BuildSketch(Plane(origin=(96.5, 0, -82.5), x_dir=(-1, 0, 0), z_dir=(0, 0, -1)), mode=Mode.PRIVATE) as mirror2_at_the_second_plane_copy_3_sk1:
        with Locations((14, 19.75)):
            Rectangle(MIRROR2_AT_THE_SECOND_PLANE_COPY_3_SKETC_W, MIRROR2_AT_THE_SECOND_PLANE_COPY_3_SKETC_H)
    mirror2_at_the_second_plane_copy_3_tool1 = split(extrude(mirror2_at_the_second_plane_copy_3_sk1.sketch, amount=MIRROR2_AT_THE_SECOND_PLANE_COPY_3_REACH, mode=Mode.PRIVATE), bisect_by=mirror2_at_the_second_plane_copy_3_end, keep=Keep.BOTH, mode=Mode.PRIVATE)
    add(mirror2_at_the_second_plane_copy_3_tool1.solids().sort_by(Axis((82.5, 19.75, -82.5), (0, 0, -1)))[0], mode=Mode.SUBTRACT)

    # Sketch12 → Cut-Extrude6 (cut)
    with BuildSketch(Plane(origin=(0, 0, -82.5), x_dir=(-1, 0, 0), z_dir=(0, 0, -1))):
        with Locations((-16.619253714, 19.183530238)):
            Rectangle(SKETCH12_W, SKETCH12_H)
    extrude(amount=CUT_EXTRUDE6_DEPTH, mode=Mode.SUBTRACT)

    # Sketch13 → Cut-Extrude7 (cut, up to next)
    with BuildSketch(Plane.XY, mode=Mode.PRIVATE) as cut_extrude7_sk1:
        with Locations((77.745438063, 20.1193122)):
            Rectangle(SKETCH13_W, SKETCH13_H)
    cut_extrude7_tool1 = extrude(cut_extrude7_sk1.sketch, amount=CUT_EXTRUDE7_REACH, mode=Mode.PRIVATE) & part.part
    add(cut_extrude7_tool1.solids().sort_by_distance((77.745438, 20.119312, 0))[0], mode=Mode.SUBTRACT)
    add(cut_extrude7_tool1.solids().sort_by_distance((77.745438, 20.119312, 0))[1], mode=Mode.SUBTRACT)


solid = part.part
